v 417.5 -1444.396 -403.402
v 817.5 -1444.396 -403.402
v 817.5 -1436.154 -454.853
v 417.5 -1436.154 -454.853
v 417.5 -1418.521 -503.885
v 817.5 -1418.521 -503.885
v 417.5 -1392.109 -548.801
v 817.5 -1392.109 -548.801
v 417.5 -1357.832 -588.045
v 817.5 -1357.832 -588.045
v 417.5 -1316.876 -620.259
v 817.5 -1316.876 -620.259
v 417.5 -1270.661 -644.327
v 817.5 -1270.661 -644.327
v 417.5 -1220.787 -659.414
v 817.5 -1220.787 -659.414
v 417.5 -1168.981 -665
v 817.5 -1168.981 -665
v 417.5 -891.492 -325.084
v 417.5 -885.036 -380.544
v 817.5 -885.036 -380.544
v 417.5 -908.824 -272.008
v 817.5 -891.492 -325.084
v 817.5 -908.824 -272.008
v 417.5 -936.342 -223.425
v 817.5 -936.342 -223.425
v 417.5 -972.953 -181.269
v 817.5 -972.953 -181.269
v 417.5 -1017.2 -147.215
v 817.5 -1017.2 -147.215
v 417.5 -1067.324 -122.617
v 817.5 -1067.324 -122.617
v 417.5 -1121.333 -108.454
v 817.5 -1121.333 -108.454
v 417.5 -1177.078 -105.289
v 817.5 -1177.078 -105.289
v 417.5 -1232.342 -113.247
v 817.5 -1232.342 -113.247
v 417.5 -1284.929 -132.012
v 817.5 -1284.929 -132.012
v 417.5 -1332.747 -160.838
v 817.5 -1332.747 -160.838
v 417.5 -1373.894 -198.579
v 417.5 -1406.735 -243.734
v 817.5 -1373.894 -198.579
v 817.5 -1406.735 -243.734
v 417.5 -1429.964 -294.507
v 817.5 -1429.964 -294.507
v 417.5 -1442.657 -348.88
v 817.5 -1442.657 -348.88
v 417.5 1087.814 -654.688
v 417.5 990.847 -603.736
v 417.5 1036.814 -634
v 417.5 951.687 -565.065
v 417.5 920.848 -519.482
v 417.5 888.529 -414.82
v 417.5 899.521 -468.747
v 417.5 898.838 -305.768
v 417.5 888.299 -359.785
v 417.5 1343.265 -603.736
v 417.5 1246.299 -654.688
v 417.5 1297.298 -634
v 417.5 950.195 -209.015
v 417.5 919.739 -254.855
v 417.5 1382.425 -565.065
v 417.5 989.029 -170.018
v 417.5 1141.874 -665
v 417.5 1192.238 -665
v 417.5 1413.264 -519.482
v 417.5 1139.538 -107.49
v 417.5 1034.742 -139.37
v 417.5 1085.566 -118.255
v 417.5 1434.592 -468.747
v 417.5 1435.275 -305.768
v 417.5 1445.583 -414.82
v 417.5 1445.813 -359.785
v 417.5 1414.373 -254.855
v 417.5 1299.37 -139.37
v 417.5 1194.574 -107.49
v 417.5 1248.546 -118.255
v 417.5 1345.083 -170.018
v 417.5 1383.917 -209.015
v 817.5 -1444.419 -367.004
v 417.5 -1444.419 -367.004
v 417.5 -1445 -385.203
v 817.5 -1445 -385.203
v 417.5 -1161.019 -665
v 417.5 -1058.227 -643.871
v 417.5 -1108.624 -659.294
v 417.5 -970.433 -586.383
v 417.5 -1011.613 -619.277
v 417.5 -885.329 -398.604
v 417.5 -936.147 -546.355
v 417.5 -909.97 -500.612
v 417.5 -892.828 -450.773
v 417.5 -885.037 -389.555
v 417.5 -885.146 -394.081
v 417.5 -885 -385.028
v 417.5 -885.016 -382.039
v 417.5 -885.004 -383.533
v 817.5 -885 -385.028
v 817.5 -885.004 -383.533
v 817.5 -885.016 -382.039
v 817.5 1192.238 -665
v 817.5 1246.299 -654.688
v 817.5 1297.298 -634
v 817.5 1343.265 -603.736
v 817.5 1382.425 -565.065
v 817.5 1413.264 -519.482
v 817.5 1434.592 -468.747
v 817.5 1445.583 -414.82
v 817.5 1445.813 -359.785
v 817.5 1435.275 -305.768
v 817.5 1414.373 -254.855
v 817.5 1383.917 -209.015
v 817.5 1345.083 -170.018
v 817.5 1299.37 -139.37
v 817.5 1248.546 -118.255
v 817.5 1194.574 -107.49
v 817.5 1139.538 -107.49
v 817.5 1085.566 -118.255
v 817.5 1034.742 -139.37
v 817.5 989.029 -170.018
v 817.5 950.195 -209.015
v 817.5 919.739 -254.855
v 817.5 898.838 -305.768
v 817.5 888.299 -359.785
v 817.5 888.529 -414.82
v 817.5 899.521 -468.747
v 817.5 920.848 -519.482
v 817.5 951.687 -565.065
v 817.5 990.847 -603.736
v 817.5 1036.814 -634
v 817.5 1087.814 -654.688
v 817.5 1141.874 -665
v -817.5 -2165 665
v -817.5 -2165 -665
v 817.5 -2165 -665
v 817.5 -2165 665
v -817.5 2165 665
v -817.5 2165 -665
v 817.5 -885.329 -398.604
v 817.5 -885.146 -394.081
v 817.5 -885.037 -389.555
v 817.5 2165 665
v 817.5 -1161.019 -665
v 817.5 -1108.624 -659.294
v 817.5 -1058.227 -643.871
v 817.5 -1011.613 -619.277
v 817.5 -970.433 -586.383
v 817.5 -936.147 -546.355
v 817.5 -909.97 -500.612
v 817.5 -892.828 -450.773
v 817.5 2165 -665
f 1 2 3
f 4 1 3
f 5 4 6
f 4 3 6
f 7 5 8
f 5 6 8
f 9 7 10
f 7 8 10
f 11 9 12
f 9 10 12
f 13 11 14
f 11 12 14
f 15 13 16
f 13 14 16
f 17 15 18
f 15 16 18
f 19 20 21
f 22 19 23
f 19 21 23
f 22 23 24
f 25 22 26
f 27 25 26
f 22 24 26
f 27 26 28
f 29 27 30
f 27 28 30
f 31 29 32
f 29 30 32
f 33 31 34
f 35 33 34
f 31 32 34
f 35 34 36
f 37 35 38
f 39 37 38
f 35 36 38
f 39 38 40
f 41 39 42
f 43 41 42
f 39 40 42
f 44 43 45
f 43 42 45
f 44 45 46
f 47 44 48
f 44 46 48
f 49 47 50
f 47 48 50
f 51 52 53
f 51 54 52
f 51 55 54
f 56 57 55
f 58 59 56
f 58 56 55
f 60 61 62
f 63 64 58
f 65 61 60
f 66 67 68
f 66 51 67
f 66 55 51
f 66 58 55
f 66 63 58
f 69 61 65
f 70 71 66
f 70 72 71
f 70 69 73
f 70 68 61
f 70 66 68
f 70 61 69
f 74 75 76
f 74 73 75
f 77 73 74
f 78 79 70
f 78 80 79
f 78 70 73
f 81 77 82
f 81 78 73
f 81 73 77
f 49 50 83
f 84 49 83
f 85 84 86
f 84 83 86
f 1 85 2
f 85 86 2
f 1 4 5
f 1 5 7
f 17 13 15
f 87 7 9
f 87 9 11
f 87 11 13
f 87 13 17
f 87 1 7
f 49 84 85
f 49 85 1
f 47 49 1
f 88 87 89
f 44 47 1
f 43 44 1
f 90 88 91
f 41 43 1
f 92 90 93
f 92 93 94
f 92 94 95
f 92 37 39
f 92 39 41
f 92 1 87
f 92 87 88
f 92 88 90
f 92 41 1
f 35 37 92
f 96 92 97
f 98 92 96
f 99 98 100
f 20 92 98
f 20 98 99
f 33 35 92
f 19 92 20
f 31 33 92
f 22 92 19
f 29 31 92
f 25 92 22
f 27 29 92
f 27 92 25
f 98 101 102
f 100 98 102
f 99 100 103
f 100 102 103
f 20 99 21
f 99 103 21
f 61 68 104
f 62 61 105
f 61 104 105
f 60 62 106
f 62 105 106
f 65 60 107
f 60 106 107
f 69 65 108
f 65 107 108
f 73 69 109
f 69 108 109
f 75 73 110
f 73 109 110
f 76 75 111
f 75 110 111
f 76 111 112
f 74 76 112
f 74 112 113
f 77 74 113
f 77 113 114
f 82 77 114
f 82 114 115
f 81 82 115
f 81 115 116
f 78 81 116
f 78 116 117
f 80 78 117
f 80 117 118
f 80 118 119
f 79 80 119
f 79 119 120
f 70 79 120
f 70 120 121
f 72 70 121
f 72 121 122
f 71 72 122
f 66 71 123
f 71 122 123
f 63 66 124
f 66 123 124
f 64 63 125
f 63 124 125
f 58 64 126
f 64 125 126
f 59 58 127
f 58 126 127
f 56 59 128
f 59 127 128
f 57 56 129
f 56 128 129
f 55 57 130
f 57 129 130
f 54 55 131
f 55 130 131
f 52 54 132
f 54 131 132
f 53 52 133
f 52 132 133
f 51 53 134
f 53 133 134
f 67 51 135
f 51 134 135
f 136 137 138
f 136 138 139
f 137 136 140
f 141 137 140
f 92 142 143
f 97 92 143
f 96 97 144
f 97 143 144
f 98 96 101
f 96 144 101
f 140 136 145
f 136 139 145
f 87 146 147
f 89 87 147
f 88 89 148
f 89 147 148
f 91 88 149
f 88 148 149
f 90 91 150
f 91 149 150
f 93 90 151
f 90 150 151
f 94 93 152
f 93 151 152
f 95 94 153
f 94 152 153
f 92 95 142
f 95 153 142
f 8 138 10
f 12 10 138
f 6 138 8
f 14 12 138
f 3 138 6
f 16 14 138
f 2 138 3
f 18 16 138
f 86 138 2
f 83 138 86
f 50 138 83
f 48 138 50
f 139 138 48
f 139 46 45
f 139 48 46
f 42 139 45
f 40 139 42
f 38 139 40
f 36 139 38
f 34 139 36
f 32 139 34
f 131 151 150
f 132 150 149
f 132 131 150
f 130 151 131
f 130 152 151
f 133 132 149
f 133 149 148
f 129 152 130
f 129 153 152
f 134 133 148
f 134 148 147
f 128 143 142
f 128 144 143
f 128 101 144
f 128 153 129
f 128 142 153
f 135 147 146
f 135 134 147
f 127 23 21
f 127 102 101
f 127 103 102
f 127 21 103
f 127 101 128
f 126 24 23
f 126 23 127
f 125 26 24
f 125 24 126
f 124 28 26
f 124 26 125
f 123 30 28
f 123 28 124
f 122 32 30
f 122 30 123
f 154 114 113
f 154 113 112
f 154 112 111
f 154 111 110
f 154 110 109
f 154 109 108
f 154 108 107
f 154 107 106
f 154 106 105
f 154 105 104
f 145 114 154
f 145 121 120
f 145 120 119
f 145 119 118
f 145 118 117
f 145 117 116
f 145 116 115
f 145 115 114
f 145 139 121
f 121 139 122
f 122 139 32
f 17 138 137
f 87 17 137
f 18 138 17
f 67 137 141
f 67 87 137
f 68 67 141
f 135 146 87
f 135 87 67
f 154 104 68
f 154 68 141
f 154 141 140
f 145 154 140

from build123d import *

# Parameters (mm, degrees)
F0_W          = 4330
F0_H          = 1330
F1_DEPTH      = 817.5
F1_DEPTH_BACK = 817.5
F5_DEPTH      = 400
F4_R          = 280
F6_DEPTH      = 400


with BuildPart() as f1:
    # F0 (on Right) → F1 (new body, two sides)
    with BuildSketch(Plane.YZ) as f1_sk:
        Rectangle(F0_W, F0_H)
    extrude(amount=F1_DEPTH)
    extrude(f1_sk.sketch, amount=-F1_DEPTH_BACK)

    # F2 (on face) → F5 (cut)
    with BuildSketch(Plane.YZ.offset(817.5)):
        with BuildLine():
            ThreePointArc((-885.329324, -398.604495), (-885.082343, -391.818398), (-885, -385.028307))
            ThreePointArc((-885, -385.028307), (-885.008978, -382.786061), (-885.035912, -380.543959))
            ThreePointArc((-885.035912, -380.543959), (-885.325431, -389.571907), (-885.329324, -398.604495))
        make_face()
        with BuildLine():
            ThreePointArc((-885.329324, -398.604495), (-885.325431, -389.571907), (-885.035912, -380.543959))
            ThreePointArc((-885.035912, -380.543959), (-1149.126052, -105.478637), (-1442.656804, -348.880015))
            ThreePointArc((-1442.656804, -348.880015), (-1442.297078, -376.180432), (-1444.39648, -403.402384))
            ThreePointArc((-1444.39648, -403.402384), (-1162.597141, -665.017996), (-885.329324, -398.604495))
        make_face()
        with BuildLine():
            ThreePointArc((-1444.39648, -403.402384), (-1442.297078, -376.180432), (-1442.656804, -348.880015))
            ThreePointArc((-1442.656804, -348.880015), (-1444.857576, -376.098733), (-1444.39648, -403.402384))
        make_face()
    extrude(amount=-F5_DEPTH, mode=Mode.SUBTRACT)

    # F4 (on face) → F6 (cut)
    with BuildSketch(Plane.YZ.offset(817.5)):
        with Locations((1167.056084, -386.134654)):
            Circle(F4_R)
    extrude(amount=-F6_DEPTH, mode=Mode.SUBTRACT)


solid = f1.part
